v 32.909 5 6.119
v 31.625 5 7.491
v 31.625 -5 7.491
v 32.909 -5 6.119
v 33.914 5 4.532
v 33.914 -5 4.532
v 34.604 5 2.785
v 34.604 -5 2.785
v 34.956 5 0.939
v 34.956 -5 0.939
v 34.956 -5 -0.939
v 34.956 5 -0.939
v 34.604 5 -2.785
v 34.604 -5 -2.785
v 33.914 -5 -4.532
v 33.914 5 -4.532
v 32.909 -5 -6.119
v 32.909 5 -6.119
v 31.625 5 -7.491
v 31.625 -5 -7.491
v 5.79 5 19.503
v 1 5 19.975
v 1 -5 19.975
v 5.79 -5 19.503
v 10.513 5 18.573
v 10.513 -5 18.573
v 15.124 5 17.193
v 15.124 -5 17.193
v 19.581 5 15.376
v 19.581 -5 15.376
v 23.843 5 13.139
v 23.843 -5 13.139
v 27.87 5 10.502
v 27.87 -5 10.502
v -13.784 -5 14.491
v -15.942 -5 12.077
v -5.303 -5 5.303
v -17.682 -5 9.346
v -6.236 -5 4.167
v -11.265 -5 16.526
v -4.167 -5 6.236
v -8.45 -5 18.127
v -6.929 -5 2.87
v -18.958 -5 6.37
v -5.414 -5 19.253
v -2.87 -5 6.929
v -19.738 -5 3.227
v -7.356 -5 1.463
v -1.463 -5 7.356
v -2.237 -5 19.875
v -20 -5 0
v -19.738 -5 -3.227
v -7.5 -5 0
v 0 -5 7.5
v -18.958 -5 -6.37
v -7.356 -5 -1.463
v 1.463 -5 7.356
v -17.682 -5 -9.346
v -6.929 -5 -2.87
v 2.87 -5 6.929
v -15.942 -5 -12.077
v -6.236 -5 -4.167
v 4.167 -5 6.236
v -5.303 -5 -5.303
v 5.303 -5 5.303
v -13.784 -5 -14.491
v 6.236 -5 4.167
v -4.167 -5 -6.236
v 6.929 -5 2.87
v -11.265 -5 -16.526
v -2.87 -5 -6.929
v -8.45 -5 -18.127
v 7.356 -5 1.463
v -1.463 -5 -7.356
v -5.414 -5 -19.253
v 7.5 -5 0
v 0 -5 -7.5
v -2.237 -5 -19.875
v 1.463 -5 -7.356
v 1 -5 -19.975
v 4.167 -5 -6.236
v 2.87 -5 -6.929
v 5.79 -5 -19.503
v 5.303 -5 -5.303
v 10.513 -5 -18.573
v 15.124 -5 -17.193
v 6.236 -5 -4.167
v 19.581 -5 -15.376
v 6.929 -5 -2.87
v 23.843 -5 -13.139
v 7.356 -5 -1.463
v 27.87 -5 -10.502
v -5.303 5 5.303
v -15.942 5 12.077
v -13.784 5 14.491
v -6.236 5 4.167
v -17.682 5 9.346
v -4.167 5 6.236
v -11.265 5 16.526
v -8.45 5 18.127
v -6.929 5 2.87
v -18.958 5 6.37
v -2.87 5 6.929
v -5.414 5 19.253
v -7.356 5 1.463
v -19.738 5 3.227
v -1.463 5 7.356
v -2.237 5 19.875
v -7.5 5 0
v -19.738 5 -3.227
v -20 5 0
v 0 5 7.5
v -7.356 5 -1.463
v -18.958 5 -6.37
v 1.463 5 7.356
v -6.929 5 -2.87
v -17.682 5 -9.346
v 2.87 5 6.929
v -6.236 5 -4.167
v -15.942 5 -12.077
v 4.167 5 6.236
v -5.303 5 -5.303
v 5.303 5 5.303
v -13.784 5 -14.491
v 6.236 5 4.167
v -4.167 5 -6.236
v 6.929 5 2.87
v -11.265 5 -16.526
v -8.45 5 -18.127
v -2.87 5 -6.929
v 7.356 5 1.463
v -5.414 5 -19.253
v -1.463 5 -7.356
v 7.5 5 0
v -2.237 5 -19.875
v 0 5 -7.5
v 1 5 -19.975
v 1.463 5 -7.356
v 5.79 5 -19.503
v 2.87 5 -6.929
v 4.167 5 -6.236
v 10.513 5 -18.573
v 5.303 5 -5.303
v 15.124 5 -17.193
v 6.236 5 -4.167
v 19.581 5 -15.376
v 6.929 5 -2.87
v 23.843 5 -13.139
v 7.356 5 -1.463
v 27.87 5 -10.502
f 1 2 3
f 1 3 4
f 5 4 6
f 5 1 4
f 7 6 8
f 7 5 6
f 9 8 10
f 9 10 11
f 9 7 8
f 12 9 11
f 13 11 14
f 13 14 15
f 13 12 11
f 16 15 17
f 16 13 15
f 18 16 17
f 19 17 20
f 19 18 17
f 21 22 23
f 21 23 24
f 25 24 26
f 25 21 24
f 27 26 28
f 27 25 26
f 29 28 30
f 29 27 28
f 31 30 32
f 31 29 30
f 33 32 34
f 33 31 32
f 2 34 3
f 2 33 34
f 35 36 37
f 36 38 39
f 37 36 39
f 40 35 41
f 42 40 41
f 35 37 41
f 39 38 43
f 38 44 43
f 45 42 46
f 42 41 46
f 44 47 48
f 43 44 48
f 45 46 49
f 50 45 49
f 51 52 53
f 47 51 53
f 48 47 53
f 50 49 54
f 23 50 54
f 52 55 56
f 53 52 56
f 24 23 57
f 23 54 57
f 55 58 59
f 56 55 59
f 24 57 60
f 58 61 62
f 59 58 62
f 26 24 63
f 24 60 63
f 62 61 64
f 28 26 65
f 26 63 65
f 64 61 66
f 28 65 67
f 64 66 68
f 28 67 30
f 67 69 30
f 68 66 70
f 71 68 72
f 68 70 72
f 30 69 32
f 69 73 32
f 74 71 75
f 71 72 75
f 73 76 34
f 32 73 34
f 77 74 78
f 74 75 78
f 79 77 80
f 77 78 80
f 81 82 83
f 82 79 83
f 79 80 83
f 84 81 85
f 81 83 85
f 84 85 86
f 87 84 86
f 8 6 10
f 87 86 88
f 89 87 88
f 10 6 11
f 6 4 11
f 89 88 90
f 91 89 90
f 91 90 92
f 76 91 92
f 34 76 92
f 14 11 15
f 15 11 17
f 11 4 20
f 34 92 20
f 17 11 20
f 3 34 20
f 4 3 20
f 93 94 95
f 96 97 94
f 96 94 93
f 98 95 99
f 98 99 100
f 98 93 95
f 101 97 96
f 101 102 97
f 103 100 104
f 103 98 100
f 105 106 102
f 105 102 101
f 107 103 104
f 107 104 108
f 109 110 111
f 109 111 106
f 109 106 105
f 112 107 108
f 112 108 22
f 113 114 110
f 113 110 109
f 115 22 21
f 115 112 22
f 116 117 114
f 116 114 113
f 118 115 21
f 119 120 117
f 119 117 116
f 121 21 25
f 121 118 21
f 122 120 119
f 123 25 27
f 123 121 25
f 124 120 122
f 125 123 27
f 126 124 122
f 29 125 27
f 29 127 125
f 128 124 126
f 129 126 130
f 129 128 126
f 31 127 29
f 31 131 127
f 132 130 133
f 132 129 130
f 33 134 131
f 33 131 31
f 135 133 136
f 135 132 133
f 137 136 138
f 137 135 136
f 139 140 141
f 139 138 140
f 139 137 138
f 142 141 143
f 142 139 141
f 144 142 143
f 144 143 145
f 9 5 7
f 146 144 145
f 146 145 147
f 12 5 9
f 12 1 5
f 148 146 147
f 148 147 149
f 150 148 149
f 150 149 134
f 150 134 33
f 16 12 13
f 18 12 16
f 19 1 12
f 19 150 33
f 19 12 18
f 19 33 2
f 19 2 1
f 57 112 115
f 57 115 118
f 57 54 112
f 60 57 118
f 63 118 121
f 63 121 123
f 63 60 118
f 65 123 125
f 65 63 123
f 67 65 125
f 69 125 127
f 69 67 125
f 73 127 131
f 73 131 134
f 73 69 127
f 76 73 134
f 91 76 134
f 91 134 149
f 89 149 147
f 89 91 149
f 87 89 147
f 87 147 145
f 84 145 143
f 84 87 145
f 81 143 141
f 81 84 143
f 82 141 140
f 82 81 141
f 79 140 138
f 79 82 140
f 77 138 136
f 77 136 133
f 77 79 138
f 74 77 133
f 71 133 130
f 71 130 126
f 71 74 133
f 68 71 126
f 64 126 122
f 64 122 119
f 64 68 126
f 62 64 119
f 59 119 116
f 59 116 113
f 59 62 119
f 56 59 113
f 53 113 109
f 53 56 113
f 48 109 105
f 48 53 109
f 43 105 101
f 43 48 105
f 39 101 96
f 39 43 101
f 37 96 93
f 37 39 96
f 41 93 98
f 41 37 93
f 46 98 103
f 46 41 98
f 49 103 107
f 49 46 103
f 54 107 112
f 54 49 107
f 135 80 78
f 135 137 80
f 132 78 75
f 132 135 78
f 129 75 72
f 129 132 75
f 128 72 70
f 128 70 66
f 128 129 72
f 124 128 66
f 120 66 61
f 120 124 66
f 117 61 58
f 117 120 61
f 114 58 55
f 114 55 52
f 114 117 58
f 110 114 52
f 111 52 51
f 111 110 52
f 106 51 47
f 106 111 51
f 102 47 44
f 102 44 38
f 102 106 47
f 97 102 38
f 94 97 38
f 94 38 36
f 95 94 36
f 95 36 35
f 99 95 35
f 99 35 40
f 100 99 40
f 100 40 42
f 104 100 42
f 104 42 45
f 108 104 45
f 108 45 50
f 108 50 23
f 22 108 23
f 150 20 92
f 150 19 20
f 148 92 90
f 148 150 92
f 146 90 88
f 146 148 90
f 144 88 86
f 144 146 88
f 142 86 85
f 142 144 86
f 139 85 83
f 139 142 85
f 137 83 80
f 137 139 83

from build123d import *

# Parameters (mm, degrees)
SKETCH1_R           = 7.5
BOSS_EXTRUDE1_DEPTH = 5


with BuildPart() as part:
    # Sketch1 → Boss-Extrude1 (new, symmetric)
    with BuildSketch(Plane(origin=(0, 0, 0), x_dir=(1, 0, 0), z_dir=(0, 1, 0))):
        with BuildLine():
            ThreePointArc((1, 19.974984355), (-20, 0), (1, -19.974984355))
            ThreePointArc((1, -19.974984355), (17.374586088, -16.33817141), (31.625, -7.490619133))
            ThreePointArc((31.625, -7.490619133), (35, 0), (31.625, 7.490619133))
            ThreePointArc((31.625, 7.490619133), (17.374586088, 16.33817141), (1, 19.974984355))
        make_face()
        Circle(SKETCH1_R, mode=Mode.SUBTRACT)
    extrude(amount=BOSS_EXTRUDE1_DEPTH, both=True)


solid = part.part
